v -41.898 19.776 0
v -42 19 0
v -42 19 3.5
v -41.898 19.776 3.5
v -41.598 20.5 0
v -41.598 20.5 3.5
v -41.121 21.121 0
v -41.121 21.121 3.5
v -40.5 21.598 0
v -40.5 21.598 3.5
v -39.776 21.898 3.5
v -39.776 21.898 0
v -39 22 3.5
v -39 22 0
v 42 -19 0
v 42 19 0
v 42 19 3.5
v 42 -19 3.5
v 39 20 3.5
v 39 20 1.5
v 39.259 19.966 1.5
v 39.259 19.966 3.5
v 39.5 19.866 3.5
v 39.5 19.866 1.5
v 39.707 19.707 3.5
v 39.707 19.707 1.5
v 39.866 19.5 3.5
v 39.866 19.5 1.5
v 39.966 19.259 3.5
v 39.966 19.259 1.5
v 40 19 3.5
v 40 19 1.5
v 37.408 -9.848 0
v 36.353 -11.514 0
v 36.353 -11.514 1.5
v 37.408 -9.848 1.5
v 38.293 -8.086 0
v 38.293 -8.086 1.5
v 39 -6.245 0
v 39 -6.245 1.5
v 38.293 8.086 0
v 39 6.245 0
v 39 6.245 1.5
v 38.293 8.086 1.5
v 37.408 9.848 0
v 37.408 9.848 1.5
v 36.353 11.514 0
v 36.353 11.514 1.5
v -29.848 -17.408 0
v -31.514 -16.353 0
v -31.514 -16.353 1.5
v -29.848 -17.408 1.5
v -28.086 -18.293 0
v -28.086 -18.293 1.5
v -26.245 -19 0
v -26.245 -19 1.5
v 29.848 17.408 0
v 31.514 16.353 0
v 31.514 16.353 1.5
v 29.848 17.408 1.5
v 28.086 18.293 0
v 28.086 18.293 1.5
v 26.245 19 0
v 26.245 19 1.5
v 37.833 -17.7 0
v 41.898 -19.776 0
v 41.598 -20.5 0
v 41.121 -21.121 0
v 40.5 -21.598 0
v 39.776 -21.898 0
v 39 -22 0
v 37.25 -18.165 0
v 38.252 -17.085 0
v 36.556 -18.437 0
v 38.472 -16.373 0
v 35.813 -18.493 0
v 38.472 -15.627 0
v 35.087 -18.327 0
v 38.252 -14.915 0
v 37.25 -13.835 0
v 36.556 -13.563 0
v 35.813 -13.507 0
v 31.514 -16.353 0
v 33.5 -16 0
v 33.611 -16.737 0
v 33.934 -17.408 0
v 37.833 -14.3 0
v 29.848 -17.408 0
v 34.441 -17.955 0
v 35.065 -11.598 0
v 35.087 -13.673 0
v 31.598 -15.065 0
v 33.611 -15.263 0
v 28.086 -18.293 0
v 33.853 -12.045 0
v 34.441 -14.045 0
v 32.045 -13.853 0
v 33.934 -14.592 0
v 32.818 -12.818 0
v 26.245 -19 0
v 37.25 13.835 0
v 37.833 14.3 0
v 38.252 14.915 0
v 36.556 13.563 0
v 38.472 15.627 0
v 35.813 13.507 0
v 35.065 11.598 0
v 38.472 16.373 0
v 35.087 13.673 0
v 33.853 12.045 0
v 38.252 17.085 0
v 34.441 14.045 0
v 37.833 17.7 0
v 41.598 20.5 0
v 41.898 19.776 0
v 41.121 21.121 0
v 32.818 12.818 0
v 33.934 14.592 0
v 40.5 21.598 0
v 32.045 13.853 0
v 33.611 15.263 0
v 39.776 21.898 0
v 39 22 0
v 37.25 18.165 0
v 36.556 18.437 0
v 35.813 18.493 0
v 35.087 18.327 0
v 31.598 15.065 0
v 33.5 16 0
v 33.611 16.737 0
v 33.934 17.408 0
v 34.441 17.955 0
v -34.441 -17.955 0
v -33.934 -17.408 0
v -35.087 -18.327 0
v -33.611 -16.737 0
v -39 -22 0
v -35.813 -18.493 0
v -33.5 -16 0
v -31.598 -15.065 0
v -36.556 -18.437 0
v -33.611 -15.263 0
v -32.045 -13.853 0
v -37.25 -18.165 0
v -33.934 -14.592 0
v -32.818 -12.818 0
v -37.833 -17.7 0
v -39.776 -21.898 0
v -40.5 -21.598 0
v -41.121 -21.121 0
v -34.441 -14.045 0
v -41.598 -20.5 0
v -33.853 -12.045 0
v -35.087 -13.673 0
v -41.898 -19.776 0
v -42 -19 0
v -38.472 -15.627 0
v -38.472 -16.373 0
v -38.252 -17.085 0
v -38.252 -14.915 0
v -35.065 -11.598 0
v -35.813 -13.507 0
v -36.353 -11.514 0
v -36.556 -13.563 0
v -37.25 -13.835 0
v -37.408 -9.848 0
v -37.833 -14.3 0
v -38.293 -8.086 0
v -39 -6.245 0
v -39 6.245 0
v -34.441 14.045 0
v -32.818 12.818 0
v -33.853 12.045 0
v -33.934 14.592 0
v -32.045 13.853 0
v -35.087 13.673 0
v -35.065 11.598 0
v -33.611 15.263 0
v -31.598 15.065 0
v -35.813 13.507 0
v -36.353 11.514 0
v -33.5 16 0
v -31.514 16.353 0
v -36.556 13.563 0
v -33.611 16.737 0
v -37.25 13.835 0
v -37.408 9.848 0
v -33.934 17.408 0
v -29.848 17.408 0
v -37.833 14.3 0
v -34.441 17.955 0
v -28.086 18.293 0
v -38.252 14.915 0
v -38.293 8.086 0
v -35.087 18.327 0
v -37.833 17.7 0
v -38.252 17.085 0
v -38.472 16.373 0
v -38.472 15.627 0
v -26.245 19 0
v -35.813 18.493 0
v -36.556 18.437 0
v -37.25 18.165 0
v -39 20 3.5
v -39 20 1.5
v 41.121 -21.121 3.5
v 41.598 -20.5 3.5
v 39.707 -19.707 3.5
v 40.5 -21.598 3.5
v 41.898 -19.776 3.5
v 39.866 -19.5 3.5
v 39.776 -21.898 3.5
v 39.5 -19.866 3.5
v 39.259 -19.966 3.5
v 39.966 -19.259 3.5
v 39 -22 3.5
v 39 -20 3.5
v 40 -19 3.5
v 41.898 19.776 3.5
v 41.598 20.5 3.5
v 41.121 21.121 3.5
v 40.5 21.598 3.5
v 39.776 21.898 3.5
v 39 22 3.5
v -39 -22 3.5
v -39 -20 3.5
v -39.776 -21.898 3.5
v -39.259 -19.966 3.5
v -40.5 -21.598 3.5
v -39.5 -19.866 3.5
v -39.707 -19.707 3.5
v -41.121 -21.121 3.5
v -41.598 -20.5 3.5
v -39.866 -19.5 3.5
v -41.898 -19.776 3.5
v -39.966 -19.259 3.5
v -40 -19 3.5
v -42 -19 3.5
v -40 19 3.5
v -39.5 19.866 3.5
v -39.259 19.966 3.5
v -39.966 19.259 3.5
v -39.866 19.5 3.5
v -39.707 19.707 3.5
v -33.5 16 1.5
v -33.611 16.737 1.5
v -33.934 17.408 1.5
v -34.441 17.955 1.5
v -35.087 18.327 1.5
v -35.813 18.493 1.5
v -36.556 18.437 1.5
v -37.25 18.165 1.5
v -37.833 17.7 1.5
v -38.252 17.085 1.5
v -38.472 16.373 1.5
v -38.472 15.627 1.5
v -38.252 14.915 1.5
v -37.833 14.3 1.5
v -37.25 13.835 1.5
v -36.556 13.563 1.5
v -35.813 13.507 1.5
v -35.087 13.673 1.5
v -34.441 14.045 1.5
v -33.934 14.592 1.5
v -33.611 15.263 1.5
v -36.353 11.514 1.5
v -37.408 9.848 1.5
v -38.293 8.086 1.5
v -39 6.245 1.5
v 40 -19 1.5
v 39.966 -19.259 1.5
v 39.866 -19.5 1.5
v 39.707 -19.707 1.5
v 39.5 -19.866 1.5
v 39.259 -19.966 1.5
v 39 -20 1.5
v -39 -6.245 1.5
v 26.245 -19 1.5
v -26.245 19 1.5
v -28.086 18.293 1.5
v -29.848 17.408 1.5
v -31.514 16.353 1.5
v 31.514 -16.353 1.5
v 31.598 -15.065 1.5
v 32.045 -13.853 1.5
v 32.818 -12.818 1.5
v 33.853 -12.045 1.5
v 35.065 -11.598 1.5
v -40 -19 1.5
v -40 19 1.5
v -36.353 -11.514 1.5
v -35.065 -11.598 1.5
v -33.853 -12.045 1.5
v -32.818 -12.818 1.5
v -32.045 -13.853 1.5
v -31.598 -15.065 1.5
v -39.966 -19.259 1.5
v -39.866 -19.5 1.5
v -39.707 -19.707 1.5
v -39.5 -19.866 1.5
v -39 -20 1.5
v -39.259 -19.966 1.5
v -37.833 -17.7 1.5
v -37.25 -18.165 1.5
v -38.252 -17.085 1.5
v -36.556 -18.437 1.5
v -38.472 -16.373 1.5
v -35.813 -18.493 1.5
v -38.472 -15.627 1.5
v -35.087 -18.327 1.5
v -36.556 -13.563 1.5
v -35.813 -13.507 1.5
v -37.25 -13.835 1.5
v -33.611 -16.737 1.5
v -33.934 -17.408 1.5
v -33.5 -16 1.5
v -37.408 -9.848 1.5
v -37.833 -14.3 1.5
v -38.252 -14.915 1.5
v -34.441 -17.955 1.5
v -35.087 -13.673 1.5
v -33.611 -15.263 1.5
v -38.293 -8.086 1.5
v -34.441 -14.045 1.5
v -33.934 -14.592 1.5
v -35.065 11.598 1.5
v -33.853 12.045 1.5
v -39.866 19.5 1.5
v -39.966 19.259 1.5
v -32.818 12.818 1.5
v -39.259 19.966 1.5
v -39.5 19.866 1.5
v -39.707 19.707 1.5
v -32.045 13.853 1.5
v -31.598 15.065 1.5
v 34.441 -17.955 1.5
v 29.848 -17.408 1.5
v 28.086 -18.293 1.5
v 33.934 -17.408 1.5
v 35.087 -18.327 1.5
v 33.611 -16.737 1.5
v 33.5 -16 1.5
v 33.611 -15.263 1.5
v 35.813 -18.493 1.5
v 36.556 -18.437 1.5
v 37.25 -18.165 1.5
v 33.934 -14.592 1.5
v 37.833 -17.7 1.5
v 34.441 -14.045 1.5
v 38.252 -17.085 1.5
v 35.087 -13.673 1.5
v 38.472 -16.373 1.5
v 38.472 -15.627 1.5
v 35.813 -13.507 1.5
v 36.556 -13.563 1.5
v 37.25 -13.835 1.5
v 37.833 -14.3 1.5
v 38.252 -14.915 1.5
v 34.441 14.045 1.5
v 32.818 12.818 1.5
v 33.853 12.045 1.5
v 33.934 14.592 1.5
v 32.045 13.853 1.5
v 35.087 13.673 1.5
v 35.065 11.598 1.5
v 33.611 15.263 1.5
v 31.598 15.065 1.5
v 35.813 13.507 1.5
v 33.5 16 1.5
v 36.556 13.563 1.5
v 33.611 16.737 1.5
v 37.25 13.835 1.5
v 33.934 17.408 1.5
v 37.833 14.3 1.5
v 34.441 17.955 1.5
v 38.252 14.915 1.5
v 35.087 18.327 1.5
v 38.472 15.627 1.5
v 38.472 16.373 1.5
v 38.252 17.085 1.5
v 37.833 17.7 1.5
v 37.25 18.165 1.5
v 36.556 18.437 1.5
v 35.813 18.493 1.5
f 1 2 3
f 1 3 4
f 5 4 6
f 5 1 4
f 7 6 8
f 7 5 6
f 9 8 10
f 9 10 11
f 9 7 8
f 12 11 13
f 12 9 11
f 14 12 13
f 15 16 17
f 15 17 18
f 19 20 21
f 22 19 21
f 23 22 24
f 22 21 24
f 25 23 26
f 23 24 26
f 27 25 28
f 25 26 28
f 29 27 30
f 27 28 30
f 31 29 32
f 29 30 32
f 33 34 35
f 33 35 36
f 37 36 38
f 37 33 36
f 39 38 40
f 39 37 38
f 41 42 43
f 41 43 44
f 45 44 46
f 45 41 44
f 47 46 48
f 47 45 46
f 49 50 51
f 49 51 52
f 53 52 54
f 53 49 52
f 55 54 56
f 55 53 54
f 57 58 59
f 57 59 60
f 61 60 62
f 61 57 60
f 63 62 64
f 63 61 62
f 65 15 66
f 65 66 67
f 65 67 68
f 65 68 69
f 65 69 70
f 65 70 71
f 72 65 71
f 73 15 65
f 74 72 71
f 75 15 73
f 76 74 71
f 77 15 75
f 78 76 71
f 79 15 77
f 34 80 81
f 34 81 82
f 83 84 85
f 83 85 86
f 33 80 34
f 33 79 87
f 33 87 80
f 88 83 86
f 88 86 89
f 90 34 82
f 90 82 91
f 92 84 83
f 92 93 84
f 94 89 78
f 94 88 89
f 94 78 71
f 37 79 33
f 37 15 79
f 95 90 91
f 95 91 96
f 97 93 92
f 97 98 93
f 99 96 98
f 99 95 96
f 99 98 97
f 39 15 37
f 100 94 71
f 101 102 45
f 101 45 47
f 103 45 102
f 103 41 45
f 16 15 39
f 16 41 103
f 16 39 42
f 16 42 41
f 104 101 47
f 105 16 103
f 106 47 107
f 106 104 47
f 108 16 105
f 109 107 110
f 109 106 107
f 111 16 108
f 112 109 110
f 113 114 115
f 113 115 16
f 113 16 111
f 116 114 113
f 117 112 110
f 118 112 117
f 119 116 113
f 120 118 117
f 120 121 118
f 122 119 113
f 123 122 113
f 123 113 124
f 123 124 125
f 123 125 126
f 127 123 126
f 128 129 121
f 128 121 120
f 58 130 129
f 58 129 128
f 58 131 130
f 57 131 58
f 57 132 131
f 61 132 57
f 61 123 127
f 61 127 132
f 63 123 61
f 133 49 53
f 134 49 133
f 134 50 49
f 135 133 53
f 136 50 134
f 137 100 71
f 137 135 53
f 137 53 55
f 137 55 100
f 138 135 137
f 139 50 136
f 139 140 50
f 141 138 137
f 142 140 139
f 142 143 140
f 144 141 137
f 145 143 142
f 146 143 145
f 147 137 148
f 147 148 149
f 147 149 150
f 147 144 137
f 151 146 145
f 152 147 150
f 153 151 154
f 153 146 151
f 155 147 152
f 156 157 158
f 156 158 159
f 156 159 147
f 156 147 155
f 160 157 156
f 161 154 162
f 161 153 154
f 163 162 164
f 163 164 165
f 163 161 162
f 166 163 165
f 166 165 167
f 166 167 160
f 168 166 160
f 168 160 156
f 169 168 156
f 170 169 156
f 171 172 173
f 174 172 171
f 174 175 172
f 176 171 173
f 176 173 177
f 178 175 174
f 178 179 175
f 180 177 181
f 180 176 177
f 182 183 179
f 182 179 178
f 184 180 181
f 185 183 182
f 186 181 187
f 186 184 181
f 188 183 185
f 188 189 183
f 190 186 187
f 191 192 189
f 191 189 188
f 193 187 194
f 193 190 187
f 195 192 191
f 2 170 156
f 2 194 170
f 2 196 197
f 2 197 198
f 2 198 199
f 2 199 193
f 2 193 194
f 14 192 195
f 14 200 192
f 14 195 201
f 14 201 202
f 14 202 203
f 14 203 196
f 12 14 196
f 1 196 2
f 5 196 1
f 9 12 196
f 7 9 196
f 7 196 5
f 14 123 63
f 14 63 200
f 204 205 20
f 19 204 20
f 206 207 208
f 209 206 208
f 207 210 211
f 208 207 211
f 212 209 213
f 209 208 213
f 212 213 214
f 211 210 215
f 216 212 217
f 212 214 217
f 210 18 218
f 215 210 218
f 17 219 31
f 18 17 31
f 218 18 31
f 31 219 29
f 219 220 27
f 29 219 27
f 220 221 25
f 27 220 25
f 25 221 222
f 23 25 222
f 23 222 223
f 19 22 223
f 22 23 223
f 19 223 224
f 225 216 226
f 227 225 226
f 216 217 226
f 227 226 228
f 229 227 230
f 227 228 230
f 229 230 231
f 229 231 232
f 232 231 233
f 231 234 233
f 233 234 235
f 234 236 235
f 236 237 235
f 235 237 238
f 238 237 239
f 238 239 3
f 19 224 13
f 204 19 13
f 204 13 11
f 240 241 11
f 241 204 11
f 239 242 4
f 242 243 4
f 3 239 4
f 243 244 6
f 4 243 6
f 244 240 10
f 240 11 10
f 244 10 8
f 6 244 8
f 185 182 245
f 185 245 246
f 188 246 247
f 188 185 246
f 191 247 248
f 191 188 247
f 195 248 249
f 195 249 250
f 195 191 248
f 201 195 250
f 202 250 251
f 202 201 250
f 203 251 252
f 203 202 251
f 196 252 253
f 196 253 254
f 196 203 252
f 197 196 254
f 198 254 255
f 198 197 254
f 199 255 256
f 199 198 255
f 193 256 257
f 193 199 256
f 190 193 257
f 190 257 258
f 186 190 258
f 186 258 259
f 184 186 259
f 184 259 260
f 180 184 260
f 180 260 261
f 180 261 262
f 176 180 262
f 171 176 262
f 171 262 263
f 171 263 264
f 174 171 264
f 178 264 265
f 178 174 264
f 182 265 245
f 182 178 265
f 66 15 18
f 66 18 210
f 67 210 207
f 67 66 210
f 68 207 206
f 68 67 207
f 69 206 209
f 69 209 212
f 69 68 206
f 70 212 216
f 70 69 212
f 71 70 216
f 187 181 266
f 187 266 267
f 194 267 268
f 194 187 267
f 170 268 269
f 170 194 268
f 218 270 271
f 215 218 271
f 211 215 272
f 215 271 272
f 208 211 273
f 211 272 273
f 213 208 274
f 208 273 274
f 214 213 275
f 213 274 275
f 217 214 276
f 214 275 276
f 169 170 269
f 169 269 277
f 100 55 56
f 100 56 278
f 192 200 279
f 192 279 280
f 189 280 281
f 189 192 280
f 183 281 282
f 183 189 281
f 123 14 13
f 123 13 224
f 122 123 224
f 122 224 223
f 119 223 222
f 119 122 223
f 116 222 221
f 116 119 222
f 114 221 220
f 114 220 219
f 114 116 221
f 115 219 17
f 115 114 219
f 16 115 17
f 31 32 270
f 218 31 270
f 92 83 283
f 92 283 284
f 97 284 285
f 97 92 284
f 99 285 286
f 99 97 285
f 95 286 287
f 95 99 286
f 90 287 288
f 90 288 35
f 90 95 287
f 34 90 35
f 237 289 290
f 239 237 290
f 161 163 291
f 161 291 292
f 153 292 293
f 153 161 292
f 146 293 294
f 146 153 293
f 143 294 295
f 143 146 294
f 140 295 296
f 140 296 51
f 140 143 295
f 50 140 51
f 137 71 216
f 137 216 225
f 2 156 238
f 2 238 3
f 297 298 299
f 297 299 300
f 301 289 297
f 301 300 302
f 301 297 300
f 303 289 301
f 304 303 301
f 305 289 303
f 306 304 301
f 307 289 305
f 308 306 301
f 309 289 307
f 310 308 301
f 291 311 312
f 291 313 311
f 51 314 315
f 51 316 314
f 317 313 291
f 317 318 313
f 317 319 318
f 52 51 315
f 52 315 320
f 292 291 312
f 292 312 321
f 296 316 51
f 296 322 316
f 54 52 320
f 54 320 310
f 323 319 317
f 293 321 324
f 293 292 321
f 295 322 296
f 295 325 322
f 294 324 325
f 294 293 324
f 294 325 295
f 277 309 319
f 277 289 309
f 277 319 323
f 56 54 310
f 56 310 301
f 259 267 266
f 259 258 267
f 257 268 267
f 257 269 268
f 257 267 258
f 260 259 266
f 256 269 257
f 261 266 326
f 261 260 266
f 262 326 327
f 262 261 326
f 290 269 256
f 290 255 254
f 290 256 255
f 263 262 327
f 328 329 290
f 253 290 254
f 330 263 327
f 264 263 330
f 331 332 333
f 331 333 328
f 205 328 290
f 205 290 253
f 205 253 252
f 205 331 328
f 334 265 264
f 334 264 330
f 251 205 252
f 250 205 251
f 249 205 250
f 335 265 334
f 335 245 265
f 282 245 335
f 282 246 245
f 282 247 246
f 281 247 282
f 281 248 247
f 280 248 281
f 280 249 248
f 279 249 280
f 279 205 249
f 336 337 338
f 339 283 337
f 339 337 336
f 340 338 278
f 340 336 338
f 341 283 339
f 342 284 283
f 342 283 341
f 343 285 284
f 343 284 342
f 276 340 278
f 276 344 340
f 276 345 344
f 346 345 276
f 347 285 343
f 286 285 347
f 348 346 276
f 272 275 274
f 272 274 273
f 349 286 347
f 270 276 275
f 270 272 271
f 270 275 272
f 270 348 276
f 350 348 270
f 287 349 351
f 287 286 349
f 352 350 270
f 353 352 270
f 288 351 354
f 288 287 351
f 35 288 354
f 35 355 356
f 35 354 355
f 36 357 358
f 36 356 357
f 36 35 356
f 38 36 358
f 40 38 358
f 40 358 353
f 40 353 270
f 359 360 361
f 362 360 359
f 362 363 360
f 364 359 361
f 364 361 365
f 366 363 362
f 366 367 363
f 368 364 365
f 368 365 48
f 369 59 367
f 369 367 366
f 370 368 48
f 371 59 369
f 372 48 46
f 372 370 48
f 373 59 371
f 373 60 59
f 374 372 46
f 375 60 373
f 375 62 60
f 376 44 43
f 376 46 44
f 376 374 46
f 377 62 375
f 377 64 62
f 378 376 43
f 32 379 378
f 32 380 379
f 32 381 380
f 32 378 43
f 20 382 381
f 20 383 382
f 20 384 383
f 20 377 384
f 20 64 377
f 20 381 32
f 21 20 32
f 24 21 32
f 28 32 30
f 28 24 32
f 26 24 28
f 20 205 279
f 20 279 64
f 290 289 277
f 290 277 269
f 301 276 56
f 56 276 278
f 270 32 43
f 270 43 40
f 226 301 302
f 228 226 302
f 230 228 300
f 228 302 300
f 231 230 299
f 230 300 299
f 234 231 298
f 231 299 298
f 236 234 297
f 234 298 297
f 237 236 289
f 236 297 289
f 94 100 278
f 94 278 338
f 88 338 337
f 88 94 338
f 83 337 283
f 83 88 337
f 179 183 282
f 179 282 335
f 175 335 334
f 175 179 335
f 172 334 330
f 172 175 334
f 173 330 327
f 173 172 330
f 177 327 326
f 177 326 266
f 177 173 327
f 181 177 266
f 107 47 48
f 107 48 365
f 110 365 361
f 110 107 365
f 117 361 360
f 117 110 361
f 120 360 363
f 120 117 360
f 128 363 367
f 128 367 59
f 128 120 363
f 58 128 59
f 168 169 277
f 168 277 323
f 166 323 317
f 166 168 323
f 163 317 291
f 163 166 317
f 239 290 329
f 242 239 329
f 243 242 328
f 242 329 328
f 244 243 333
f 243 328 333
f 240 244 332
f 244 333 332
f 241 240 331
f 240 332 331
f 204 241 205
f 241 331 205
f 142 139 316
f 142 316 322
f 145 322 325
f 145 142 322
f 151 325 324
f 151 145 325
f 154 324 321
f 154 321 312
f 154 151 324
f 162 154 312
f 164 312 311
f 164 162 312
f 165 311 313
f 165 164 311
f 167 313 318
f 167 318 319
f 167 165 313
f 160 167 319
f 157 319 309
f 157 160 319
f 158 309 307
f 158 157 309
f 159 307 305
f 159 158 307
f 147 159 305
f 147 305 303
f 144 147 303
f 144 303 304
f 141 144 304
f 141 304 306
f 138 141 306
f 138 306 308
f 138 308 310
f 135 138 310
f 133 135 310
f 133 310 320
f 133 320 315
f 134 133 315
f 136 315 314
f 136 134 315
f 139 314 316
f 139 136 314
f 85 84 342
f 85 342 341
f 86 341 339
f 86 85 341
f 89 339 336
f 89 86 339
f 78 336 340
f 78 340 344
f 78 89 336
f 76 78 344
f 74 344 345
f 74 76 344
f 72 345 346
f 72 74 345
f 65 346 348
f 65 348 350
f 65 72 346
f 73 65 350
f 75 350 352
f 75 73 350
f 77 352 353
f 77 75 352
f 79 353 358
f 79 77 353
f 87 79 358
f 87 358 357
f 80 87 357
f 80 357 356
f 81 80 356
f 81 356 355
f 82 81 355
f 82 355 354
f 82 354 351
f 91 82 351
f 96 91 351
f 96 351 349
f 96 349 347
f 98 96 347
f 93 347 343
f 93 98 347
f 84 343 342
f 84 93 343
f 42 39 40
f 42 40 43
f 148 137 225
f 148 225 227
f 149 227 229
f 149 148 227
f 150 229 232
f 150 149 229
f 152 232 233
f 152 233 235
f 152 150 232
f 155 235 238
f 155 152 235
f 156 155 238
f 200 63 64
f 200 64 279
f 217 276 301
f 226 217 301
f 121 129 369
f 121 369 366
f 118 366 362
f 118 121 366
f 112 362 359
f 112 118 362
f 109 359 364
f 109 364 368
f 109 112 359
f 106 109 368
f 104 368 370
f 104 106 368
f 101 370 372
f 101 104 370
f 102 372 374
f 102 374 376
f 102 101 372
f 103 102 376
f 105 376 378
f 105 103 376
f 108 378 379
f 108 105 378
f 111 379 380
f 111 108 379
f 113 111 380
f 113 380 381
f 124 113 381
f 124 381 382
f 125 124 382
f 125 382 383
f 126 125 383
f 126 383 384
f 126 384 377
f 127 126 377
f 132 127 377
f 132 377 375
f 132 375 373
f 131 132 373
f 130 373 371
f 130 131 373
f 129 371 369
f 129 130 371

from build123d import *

# Parameters (mm, degrees)
SKETCH1_R           = 2.5
BOSS_EXTRUDE1_DEPTH = 1.5
BOSS_EXTRUDE2_DEPTH = 3.5


with BuildPart() as part:
    # Sketch1 → Boss-Extrude1 (new body)
    with BuildSketch(Plane.XY):
        with BuildLine():
            Line((39, 20), (-39, 20))
            ThreePointArc((-39, 20), (-39.707106781, 19.707106781), (-40, 19))
            Line((-40, 19), (-40, -19))
            ThreePointArc((-40, -19), (-39.707106781, -19.707106781), (-39, -20))
            Line((-39, -20), (39, -20))
            ThreePointArc((39, -20), (39.707106781, -19.707106781), (40, -19))
            Line((40, -19), (40, 19))
            ThreePointArc((40, 19), (39.707106781, 19.707106781), (39, 20))
        make_face()
        with Locations((-36, 16)):
            Circle(SKETCH1_R, mode=Mode.SUBTRACT)
        with Locations((-36, -16)):
            Circle(SKETCH1_R, mode=Mode.SUBTRACT)
        with Locations(Location((36, -16, 0), (0, 0, 180))):
            Circle(SKETCH1_R, mode=Mode.SUBTRACT)
        with Locations(Location((36, 16, 0), (0, 0, 180))):
            Circle(SKETCH1_R, mode=Mode.SUBTRACT)
        with BuildLine():
            Line((26.244997998, 19), (-26.244997998, 19))
            ThreePointArc((-26.244997998, 19), (-28.977515605, 17.871883325), (-31.513890212, 16.353297288))
            ThreePointArc((-31.513890212, 16.353297288), (-32.818019485, 12.818019485), (-36.353297288, 11.513890212))
            ThreePointArc((-36.353297288, 11.513890212), (-37.871883325, 8.977515605), (-39, 6.244997998))
            Line((-39, 6.244997998), (-39, -6.244997998))
            ThreePointArc((-39, -6.244997998), (-37.871883325, -8.977515605), (-36.353297288, -11.513890212))
            ThreePointArc((-36.353297288, -11.513890212), (-32.818019485, -12.818019485), (-31.513890212, -16.353297288))
            ThreePointArc((-31.513890212, -16.353297288), (-28.977515605, -17.871883325), (-26.244997998, -19))
            Line((-26.244997998, -19), (26.244997998, -19))
            ThreePointArc((26.244997998, -19), (28.977515605, -17.871883325), (31.513890212, -16.353297288))
            ThreePointArc((31.513890212, -16.353297288), (32.818019485, -12.818019485), (36.353297288, -11.513890212))
            ThreePointArc((36.353297288, -11.513890212), (37.871883325, -8.977515605), (39, -6.244997998))
            Line((39, -6.244997998), (39, 6.244997998))
            ThreePointArc((39, 6.244997998), (37.871883325, 8.977515605), (36.353297288, 11.513890212))
            ThreePointArc((36.353297288, 11.513890212), (32.818019485, 12.818019485), (31.513890212, 16.353297288))
            ThreePointArc((31.513890212, 16.353297288), (28.977515605, 17.871883325), (26.244997998, 19))
        make_face(mode=Mode.SUBTRACT)
    extrude(amount=BOSS_EXTRUDE1_DEPTH)

    # Sketch2 → Boss-Extrude2 (add)
    with BuildSketch(Plane(origin=(0, 0, 0), x_dir=(-1, 0, 0), z_dir=(0, 0, -1))):
        with BuildLine():
            Line((39, 22), (-39, 22))
            ThreePointArc((-39, 22), (-41.121320344, 21.121320344), (-42, 19))
            Line((-42, 19), (-42, -19))
            ThreePointArc((-42, -19), (-41.121320344, -21.121320344), (-39, -22))
            Line((-39, -22), (39, -22))
            ThreePointArc((39, -22), (41.121320344, -21.121320344), (42, -19))
            Line((42, -19), (42, 19))
            ThreePointArc((42, 19), (41.121320344, 21.121320344), (39, 22))
        make_face()
        with BuildLine():
            Line((40, -19), (40, 19))
            ThreePointArc((40, 19), (39.707106781, 19.707106781), (39, 20))
            Line((39, 20), (-39, 20))
            ThreePointArc((-39, 20), (-39.707106781, 19.707106781), (-40, 19))
            Line((-40, 19), (-40, -19))
            ThreePointArc((-40, -19), (-39.707106781, -19.707106781), (-39, -20))
            Line((-39, -20), (39, -20))
            ThreePointArc((39, -20), (39.707106781, -19.707106781), (40, -19))
        make_face(mode=Mode.SUBTRACT)
    extrude(amount=-BOSS_EXTRUDE2_DEPTH)


solid = part.part
